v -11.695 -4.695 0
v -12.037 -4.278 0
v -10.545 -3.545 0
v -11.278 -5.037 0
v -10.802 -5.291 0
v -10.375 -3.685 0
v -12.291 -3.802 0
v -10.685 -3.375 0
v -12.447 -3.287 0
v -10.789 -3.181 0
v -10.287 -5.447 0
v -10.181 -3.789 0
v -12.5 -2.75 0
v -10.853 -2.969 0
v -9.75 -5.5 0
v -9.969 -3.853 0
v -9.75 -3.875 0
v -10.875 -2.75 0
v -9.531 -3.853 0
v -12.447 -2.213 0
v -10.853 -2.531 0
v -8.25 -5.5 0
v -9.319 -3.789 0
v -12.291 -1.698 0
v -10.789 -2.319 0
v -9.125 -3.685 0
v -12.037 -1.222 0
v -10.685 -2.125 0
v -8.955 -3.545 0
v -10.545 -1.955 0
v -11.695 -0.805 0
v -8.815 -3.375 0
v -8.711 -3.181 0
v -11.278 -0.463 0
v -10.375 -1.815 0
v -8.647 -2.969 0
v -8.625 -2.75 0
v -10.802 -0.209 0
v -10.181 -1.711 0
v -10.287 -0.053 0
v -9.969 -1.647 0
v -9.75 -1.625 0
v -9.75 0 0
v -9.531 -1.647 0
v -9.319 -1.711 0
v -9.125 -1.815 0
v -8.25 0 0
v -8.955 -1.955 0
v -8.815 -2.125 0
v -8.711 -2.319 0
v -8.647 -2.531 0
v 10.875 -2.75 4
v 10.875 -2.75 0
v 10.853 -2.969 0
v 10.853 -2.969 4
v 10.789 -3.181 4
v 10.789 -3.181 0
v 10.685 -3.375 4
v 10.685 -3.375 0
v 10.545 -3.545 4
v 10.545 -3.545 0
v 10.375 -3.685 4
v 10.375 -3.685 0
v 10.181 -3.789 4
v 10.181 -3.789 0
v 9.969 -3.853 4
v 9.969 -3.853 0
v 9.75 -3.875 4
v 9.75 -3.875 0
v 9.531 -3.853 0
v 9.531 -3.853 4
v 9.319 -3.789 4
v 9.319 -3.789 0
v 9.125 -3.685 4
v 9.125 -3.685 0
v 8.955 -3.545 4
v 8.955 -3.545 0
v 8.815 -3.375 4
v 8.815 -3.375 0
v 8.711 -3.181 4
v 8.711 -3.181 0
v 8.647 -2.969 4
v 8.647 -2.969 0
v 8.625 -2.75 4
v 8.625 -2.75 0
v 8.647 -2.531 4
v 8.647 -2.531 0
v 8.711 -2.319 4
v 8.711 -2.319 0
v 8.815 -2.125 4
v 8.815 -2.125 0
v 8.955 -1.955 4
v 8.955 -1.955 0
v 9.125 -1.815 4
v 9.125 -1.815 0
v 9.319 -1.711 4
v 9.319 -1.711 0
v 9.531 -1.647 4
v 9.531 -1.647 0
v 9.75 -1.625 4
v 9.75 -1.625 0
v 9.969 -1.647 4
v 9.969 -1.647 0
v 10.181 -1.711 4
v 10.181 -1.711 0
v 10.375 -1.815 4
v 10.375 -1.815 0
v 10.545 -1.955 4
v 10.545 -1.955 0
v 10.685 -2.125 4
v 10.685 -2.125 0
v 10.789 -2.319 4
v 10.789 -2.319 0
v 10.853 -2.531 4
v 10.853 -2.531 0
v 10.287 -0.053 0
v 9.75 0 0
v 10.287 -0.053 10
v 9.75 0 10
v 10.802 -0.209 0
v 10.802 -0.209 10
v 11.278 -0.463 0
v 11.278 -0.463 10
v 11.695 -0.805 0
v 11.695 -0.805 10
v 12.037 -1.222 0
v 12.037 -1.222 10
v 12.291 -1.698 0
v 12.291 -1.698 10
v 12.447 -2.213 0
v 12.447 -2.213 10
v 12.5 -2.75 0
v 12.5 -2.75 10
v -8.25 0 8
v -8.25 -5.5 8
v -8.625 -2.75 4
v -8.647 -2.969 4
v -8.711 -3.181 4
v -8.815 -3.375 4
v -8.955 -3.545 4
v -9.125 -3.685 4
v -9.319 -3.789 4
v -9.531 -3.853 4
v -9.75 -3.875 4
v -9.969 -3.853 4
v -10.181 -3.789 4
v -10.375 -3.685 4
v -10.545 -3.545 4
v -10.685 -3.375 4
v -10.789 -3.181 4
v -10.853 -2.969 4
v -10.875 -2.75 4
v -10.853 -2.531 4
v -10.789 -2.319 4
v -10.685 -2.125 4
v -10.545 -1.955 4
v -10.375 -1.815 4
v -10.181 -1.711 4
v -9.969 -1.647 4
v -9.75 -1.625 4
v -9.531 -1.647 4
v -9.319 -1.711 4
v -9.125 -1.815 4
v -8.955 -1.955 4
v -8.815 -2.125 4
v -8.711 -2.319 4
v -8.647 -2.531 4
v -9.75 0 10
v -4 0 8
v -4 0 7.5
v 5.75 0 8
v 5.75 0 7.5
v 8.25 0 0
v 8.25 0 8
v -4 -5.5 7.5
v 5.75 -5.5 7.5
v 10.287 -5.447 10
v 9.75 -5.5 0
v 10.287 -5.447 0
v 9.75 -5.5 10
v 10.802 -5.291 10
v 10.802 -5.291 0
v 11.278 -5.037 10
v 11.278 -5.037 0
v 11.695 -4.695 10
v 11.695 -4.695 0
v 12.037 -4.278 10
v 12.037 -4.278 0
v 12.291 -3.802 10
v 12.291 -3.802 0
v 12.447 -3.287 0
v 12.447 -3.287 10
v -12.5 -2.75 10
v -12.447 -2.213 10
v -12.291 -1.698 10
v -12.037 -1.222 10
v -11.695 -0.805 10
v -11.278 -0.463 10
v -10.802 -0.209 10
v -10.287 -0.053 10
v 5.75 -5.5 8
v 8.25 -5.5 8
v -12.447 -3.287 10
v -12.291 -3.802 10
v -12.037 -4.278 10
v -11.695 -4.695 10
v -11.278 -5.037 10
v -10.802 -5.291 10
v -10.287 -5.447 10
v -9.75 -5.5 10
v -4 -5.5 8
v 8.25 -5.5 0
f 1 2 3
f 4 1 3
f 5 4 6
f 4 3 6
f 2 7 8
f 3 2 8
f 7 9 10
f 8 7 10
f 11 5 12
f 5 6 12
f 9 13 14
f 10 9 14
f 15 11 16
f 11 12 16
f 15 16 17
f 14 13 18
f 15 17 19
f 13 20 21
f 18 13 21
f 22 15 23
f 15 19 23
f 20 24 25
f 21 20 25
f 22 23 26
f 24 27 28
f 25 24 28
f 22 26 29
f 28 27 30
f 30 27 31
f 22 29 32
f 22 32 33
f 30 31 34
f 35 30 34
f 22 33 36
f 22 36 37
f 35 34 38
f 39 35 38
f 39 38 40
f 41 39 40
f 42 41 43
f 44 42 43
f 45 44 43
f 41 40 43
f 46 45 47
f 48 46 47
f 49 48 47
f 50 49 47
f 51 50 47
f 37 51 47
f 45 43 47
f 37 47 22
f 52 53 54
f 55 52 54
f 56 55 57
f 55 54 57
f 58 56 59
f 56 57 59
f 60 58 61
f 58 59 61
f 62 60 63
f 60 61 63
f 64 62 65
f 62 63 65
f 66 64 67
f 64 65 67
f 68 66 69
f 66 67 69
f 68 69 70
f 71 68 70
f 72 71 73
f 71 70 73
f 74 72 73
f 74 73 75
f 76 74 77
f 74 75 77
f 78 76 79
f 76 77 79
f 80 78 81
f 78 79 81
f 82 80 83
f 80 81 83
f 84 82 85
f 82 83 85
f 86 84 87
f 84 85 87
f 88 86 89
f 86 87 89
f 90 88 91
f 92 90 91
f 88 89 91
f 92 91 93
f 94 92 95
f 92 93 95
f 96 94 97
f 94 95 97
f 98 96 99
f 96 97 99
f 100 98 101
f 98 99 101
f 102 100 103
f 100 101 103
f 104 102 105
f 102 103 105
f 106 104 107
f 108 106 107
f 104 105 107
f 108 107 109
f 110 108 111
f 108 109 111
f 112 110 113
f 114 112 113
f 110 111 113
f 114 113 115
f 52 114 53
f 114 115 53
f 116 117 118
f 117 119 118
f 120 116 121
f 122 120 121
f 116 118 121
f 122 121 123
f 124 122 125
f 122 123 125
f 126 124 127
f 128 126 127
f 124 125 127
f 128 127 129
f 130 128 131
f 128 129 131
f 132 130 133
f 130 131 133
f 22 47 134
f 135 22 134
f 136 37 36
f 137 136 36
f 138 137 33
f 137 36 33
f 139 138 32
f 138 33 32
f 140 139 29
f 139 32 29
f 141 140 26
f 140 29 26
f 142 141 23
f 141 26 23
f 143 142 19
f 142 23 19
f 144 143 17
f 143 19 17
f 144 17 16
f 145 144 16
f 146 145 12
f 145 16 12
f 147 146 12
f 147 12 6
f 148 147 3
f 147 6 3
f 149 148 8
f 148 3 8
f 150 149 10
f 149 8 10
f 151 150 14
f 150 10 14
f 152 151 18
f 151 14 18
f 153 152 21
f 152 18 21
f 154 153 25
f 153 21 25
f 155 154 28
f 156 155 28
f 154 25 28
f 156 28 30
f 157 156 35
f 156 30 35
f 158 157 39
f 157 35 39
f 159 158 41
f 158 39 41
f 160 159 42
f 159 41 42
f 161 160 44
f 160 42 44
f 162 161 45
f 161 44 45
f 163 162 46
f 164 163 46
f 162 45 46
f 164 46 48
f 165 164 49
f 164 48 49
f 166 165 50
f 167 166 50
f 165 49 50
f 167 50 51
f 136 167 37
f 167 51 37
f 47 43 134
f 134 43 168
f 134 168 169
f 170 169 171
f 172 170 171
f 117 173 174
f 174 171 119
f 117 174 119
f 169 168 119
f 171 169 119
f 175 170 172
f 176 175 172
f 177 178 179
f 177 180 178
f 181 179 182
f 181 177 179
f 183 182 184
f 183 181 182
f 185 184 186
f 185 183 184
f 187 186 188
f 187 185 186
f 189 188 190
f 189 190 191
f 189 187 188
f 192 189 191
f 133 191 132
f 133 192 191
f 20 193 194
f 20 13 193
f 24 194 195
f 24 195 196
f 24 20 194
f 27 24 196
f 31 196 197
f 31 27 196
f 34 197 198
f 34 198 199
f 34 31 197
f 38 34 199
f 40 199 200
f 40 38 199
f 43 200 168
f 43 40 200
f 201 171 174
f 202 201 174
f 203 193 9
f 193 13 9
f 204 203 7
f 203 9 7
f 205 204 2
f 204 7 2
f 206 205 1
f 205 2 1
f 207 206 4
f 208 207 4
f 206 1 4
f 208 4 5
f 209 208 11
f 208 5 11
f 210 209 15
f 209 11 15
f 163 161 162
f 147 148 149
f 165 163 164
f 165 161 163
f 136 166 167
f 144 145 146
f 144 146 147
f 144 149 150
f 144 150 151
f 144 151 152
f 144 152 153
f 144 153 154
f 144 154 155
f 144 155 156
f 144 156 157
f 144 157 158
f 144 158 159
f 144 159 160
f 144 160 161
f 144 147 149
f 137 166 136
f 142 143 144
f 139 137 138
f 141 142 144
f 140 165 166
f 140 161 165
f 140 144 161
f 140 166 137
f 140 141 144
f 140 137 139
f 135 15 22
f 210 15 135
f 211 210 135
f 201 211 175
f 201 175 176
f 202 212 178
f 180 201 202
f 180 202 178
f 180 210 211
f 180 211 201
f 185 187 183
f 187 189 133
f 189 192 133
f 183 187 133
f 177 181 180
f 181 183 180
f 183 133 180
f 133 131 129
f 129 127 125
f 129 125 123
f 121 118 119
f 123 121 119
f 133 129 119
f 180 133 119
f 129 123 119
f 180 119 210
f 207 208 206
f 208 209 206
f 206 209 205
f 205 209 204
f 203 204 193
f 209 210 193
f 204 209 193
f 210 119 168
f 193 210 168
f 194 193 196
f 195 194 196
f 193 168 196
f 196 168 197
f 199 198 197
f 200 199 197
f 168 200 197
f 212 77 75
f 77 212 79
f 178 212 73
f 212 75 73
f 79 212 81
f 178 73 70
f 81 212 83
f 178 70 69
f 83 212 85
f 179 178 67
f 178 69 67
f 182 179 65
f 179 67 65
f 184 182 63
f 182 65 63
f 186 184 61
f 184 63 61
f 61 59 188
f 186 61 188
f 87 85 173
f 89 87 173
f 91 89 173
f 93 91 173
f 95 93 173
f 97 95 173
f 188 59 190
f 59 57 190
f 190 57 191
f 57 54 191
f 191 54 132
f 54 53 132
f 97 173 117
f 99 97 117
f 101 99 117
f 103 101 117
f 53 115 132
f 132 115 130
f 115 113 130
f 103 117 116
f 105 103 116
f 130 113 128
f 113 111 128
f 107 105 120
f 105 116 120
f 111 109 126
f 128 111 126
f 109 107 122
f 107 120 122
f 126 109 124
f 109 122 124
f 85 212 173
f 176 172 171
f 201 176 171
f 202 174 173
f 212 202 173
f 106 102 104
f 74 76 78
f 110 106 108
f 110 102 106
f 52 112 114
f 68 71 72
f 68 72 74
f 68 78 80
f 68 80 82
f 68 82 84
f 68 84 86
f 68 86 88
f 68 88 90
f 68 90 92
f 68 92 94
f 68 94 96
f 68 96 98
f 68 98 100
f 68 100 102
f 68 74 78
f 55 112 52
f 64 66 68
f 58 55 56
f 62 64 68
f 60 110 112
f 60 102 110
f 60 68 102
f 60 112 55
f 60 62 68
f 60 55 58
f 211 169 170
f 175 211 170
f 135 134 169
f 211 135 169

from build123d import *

# Parameters (mm, degrees)
F1_DEPTH = 5.5
F2_R     = 1.125
F3_DEPTH = 4
F4_R     = 2.74999


# Not quite as in the source:
# - a fillet or chamfer is up to 0.001 mm smaller than in the source, because OpenCascade refuses the exact size


with BuildPart() as f1:
    # F0 (on Front) → F1 (new body)
    with BuildSketch(Plane.XZ):
        Polygon((-12.5, 10), (-12.5, 0), (-8.25, 0), (-8.25, 8), (-4, 8), (-4, 7.5), (5.75, 7.5), (5.75, 8), (8.25, 8), (8.25, 0), (12.5, 0), (12.5, 10), align=None)
    extrude(amount=F1_DEPTH)

    # F2 (on face) → F3 (cut)
    with BuildSketch(Plane(origin=(0, 0, 0), x_dir=(1, 0, 0), z_dir=(0, 0, -1))):
        with Locations((-9.75, 2.75)):
            Circle(F2_R)
        with Locations((9.75, 2.75)):
            Circle(F2_R)
    extrude(amount=-F3_DEPTH, mode=Mode.SUBTRACT)

    # F4 (radius 2.75 in the source; OpenCascade refuses exactly that, so slightly less here)
    f4_edges = [f1.edges().sort_by_distance(p)[0] for p in [
        (-12.5, -5.5, 5),
        (-12.5, 0, 5),
        (12.5, -5.5, 5),
        (12.5, 0, 5),
    ]]
    fillet(f4_edges, radius=F4_R)


solid = f1.part
